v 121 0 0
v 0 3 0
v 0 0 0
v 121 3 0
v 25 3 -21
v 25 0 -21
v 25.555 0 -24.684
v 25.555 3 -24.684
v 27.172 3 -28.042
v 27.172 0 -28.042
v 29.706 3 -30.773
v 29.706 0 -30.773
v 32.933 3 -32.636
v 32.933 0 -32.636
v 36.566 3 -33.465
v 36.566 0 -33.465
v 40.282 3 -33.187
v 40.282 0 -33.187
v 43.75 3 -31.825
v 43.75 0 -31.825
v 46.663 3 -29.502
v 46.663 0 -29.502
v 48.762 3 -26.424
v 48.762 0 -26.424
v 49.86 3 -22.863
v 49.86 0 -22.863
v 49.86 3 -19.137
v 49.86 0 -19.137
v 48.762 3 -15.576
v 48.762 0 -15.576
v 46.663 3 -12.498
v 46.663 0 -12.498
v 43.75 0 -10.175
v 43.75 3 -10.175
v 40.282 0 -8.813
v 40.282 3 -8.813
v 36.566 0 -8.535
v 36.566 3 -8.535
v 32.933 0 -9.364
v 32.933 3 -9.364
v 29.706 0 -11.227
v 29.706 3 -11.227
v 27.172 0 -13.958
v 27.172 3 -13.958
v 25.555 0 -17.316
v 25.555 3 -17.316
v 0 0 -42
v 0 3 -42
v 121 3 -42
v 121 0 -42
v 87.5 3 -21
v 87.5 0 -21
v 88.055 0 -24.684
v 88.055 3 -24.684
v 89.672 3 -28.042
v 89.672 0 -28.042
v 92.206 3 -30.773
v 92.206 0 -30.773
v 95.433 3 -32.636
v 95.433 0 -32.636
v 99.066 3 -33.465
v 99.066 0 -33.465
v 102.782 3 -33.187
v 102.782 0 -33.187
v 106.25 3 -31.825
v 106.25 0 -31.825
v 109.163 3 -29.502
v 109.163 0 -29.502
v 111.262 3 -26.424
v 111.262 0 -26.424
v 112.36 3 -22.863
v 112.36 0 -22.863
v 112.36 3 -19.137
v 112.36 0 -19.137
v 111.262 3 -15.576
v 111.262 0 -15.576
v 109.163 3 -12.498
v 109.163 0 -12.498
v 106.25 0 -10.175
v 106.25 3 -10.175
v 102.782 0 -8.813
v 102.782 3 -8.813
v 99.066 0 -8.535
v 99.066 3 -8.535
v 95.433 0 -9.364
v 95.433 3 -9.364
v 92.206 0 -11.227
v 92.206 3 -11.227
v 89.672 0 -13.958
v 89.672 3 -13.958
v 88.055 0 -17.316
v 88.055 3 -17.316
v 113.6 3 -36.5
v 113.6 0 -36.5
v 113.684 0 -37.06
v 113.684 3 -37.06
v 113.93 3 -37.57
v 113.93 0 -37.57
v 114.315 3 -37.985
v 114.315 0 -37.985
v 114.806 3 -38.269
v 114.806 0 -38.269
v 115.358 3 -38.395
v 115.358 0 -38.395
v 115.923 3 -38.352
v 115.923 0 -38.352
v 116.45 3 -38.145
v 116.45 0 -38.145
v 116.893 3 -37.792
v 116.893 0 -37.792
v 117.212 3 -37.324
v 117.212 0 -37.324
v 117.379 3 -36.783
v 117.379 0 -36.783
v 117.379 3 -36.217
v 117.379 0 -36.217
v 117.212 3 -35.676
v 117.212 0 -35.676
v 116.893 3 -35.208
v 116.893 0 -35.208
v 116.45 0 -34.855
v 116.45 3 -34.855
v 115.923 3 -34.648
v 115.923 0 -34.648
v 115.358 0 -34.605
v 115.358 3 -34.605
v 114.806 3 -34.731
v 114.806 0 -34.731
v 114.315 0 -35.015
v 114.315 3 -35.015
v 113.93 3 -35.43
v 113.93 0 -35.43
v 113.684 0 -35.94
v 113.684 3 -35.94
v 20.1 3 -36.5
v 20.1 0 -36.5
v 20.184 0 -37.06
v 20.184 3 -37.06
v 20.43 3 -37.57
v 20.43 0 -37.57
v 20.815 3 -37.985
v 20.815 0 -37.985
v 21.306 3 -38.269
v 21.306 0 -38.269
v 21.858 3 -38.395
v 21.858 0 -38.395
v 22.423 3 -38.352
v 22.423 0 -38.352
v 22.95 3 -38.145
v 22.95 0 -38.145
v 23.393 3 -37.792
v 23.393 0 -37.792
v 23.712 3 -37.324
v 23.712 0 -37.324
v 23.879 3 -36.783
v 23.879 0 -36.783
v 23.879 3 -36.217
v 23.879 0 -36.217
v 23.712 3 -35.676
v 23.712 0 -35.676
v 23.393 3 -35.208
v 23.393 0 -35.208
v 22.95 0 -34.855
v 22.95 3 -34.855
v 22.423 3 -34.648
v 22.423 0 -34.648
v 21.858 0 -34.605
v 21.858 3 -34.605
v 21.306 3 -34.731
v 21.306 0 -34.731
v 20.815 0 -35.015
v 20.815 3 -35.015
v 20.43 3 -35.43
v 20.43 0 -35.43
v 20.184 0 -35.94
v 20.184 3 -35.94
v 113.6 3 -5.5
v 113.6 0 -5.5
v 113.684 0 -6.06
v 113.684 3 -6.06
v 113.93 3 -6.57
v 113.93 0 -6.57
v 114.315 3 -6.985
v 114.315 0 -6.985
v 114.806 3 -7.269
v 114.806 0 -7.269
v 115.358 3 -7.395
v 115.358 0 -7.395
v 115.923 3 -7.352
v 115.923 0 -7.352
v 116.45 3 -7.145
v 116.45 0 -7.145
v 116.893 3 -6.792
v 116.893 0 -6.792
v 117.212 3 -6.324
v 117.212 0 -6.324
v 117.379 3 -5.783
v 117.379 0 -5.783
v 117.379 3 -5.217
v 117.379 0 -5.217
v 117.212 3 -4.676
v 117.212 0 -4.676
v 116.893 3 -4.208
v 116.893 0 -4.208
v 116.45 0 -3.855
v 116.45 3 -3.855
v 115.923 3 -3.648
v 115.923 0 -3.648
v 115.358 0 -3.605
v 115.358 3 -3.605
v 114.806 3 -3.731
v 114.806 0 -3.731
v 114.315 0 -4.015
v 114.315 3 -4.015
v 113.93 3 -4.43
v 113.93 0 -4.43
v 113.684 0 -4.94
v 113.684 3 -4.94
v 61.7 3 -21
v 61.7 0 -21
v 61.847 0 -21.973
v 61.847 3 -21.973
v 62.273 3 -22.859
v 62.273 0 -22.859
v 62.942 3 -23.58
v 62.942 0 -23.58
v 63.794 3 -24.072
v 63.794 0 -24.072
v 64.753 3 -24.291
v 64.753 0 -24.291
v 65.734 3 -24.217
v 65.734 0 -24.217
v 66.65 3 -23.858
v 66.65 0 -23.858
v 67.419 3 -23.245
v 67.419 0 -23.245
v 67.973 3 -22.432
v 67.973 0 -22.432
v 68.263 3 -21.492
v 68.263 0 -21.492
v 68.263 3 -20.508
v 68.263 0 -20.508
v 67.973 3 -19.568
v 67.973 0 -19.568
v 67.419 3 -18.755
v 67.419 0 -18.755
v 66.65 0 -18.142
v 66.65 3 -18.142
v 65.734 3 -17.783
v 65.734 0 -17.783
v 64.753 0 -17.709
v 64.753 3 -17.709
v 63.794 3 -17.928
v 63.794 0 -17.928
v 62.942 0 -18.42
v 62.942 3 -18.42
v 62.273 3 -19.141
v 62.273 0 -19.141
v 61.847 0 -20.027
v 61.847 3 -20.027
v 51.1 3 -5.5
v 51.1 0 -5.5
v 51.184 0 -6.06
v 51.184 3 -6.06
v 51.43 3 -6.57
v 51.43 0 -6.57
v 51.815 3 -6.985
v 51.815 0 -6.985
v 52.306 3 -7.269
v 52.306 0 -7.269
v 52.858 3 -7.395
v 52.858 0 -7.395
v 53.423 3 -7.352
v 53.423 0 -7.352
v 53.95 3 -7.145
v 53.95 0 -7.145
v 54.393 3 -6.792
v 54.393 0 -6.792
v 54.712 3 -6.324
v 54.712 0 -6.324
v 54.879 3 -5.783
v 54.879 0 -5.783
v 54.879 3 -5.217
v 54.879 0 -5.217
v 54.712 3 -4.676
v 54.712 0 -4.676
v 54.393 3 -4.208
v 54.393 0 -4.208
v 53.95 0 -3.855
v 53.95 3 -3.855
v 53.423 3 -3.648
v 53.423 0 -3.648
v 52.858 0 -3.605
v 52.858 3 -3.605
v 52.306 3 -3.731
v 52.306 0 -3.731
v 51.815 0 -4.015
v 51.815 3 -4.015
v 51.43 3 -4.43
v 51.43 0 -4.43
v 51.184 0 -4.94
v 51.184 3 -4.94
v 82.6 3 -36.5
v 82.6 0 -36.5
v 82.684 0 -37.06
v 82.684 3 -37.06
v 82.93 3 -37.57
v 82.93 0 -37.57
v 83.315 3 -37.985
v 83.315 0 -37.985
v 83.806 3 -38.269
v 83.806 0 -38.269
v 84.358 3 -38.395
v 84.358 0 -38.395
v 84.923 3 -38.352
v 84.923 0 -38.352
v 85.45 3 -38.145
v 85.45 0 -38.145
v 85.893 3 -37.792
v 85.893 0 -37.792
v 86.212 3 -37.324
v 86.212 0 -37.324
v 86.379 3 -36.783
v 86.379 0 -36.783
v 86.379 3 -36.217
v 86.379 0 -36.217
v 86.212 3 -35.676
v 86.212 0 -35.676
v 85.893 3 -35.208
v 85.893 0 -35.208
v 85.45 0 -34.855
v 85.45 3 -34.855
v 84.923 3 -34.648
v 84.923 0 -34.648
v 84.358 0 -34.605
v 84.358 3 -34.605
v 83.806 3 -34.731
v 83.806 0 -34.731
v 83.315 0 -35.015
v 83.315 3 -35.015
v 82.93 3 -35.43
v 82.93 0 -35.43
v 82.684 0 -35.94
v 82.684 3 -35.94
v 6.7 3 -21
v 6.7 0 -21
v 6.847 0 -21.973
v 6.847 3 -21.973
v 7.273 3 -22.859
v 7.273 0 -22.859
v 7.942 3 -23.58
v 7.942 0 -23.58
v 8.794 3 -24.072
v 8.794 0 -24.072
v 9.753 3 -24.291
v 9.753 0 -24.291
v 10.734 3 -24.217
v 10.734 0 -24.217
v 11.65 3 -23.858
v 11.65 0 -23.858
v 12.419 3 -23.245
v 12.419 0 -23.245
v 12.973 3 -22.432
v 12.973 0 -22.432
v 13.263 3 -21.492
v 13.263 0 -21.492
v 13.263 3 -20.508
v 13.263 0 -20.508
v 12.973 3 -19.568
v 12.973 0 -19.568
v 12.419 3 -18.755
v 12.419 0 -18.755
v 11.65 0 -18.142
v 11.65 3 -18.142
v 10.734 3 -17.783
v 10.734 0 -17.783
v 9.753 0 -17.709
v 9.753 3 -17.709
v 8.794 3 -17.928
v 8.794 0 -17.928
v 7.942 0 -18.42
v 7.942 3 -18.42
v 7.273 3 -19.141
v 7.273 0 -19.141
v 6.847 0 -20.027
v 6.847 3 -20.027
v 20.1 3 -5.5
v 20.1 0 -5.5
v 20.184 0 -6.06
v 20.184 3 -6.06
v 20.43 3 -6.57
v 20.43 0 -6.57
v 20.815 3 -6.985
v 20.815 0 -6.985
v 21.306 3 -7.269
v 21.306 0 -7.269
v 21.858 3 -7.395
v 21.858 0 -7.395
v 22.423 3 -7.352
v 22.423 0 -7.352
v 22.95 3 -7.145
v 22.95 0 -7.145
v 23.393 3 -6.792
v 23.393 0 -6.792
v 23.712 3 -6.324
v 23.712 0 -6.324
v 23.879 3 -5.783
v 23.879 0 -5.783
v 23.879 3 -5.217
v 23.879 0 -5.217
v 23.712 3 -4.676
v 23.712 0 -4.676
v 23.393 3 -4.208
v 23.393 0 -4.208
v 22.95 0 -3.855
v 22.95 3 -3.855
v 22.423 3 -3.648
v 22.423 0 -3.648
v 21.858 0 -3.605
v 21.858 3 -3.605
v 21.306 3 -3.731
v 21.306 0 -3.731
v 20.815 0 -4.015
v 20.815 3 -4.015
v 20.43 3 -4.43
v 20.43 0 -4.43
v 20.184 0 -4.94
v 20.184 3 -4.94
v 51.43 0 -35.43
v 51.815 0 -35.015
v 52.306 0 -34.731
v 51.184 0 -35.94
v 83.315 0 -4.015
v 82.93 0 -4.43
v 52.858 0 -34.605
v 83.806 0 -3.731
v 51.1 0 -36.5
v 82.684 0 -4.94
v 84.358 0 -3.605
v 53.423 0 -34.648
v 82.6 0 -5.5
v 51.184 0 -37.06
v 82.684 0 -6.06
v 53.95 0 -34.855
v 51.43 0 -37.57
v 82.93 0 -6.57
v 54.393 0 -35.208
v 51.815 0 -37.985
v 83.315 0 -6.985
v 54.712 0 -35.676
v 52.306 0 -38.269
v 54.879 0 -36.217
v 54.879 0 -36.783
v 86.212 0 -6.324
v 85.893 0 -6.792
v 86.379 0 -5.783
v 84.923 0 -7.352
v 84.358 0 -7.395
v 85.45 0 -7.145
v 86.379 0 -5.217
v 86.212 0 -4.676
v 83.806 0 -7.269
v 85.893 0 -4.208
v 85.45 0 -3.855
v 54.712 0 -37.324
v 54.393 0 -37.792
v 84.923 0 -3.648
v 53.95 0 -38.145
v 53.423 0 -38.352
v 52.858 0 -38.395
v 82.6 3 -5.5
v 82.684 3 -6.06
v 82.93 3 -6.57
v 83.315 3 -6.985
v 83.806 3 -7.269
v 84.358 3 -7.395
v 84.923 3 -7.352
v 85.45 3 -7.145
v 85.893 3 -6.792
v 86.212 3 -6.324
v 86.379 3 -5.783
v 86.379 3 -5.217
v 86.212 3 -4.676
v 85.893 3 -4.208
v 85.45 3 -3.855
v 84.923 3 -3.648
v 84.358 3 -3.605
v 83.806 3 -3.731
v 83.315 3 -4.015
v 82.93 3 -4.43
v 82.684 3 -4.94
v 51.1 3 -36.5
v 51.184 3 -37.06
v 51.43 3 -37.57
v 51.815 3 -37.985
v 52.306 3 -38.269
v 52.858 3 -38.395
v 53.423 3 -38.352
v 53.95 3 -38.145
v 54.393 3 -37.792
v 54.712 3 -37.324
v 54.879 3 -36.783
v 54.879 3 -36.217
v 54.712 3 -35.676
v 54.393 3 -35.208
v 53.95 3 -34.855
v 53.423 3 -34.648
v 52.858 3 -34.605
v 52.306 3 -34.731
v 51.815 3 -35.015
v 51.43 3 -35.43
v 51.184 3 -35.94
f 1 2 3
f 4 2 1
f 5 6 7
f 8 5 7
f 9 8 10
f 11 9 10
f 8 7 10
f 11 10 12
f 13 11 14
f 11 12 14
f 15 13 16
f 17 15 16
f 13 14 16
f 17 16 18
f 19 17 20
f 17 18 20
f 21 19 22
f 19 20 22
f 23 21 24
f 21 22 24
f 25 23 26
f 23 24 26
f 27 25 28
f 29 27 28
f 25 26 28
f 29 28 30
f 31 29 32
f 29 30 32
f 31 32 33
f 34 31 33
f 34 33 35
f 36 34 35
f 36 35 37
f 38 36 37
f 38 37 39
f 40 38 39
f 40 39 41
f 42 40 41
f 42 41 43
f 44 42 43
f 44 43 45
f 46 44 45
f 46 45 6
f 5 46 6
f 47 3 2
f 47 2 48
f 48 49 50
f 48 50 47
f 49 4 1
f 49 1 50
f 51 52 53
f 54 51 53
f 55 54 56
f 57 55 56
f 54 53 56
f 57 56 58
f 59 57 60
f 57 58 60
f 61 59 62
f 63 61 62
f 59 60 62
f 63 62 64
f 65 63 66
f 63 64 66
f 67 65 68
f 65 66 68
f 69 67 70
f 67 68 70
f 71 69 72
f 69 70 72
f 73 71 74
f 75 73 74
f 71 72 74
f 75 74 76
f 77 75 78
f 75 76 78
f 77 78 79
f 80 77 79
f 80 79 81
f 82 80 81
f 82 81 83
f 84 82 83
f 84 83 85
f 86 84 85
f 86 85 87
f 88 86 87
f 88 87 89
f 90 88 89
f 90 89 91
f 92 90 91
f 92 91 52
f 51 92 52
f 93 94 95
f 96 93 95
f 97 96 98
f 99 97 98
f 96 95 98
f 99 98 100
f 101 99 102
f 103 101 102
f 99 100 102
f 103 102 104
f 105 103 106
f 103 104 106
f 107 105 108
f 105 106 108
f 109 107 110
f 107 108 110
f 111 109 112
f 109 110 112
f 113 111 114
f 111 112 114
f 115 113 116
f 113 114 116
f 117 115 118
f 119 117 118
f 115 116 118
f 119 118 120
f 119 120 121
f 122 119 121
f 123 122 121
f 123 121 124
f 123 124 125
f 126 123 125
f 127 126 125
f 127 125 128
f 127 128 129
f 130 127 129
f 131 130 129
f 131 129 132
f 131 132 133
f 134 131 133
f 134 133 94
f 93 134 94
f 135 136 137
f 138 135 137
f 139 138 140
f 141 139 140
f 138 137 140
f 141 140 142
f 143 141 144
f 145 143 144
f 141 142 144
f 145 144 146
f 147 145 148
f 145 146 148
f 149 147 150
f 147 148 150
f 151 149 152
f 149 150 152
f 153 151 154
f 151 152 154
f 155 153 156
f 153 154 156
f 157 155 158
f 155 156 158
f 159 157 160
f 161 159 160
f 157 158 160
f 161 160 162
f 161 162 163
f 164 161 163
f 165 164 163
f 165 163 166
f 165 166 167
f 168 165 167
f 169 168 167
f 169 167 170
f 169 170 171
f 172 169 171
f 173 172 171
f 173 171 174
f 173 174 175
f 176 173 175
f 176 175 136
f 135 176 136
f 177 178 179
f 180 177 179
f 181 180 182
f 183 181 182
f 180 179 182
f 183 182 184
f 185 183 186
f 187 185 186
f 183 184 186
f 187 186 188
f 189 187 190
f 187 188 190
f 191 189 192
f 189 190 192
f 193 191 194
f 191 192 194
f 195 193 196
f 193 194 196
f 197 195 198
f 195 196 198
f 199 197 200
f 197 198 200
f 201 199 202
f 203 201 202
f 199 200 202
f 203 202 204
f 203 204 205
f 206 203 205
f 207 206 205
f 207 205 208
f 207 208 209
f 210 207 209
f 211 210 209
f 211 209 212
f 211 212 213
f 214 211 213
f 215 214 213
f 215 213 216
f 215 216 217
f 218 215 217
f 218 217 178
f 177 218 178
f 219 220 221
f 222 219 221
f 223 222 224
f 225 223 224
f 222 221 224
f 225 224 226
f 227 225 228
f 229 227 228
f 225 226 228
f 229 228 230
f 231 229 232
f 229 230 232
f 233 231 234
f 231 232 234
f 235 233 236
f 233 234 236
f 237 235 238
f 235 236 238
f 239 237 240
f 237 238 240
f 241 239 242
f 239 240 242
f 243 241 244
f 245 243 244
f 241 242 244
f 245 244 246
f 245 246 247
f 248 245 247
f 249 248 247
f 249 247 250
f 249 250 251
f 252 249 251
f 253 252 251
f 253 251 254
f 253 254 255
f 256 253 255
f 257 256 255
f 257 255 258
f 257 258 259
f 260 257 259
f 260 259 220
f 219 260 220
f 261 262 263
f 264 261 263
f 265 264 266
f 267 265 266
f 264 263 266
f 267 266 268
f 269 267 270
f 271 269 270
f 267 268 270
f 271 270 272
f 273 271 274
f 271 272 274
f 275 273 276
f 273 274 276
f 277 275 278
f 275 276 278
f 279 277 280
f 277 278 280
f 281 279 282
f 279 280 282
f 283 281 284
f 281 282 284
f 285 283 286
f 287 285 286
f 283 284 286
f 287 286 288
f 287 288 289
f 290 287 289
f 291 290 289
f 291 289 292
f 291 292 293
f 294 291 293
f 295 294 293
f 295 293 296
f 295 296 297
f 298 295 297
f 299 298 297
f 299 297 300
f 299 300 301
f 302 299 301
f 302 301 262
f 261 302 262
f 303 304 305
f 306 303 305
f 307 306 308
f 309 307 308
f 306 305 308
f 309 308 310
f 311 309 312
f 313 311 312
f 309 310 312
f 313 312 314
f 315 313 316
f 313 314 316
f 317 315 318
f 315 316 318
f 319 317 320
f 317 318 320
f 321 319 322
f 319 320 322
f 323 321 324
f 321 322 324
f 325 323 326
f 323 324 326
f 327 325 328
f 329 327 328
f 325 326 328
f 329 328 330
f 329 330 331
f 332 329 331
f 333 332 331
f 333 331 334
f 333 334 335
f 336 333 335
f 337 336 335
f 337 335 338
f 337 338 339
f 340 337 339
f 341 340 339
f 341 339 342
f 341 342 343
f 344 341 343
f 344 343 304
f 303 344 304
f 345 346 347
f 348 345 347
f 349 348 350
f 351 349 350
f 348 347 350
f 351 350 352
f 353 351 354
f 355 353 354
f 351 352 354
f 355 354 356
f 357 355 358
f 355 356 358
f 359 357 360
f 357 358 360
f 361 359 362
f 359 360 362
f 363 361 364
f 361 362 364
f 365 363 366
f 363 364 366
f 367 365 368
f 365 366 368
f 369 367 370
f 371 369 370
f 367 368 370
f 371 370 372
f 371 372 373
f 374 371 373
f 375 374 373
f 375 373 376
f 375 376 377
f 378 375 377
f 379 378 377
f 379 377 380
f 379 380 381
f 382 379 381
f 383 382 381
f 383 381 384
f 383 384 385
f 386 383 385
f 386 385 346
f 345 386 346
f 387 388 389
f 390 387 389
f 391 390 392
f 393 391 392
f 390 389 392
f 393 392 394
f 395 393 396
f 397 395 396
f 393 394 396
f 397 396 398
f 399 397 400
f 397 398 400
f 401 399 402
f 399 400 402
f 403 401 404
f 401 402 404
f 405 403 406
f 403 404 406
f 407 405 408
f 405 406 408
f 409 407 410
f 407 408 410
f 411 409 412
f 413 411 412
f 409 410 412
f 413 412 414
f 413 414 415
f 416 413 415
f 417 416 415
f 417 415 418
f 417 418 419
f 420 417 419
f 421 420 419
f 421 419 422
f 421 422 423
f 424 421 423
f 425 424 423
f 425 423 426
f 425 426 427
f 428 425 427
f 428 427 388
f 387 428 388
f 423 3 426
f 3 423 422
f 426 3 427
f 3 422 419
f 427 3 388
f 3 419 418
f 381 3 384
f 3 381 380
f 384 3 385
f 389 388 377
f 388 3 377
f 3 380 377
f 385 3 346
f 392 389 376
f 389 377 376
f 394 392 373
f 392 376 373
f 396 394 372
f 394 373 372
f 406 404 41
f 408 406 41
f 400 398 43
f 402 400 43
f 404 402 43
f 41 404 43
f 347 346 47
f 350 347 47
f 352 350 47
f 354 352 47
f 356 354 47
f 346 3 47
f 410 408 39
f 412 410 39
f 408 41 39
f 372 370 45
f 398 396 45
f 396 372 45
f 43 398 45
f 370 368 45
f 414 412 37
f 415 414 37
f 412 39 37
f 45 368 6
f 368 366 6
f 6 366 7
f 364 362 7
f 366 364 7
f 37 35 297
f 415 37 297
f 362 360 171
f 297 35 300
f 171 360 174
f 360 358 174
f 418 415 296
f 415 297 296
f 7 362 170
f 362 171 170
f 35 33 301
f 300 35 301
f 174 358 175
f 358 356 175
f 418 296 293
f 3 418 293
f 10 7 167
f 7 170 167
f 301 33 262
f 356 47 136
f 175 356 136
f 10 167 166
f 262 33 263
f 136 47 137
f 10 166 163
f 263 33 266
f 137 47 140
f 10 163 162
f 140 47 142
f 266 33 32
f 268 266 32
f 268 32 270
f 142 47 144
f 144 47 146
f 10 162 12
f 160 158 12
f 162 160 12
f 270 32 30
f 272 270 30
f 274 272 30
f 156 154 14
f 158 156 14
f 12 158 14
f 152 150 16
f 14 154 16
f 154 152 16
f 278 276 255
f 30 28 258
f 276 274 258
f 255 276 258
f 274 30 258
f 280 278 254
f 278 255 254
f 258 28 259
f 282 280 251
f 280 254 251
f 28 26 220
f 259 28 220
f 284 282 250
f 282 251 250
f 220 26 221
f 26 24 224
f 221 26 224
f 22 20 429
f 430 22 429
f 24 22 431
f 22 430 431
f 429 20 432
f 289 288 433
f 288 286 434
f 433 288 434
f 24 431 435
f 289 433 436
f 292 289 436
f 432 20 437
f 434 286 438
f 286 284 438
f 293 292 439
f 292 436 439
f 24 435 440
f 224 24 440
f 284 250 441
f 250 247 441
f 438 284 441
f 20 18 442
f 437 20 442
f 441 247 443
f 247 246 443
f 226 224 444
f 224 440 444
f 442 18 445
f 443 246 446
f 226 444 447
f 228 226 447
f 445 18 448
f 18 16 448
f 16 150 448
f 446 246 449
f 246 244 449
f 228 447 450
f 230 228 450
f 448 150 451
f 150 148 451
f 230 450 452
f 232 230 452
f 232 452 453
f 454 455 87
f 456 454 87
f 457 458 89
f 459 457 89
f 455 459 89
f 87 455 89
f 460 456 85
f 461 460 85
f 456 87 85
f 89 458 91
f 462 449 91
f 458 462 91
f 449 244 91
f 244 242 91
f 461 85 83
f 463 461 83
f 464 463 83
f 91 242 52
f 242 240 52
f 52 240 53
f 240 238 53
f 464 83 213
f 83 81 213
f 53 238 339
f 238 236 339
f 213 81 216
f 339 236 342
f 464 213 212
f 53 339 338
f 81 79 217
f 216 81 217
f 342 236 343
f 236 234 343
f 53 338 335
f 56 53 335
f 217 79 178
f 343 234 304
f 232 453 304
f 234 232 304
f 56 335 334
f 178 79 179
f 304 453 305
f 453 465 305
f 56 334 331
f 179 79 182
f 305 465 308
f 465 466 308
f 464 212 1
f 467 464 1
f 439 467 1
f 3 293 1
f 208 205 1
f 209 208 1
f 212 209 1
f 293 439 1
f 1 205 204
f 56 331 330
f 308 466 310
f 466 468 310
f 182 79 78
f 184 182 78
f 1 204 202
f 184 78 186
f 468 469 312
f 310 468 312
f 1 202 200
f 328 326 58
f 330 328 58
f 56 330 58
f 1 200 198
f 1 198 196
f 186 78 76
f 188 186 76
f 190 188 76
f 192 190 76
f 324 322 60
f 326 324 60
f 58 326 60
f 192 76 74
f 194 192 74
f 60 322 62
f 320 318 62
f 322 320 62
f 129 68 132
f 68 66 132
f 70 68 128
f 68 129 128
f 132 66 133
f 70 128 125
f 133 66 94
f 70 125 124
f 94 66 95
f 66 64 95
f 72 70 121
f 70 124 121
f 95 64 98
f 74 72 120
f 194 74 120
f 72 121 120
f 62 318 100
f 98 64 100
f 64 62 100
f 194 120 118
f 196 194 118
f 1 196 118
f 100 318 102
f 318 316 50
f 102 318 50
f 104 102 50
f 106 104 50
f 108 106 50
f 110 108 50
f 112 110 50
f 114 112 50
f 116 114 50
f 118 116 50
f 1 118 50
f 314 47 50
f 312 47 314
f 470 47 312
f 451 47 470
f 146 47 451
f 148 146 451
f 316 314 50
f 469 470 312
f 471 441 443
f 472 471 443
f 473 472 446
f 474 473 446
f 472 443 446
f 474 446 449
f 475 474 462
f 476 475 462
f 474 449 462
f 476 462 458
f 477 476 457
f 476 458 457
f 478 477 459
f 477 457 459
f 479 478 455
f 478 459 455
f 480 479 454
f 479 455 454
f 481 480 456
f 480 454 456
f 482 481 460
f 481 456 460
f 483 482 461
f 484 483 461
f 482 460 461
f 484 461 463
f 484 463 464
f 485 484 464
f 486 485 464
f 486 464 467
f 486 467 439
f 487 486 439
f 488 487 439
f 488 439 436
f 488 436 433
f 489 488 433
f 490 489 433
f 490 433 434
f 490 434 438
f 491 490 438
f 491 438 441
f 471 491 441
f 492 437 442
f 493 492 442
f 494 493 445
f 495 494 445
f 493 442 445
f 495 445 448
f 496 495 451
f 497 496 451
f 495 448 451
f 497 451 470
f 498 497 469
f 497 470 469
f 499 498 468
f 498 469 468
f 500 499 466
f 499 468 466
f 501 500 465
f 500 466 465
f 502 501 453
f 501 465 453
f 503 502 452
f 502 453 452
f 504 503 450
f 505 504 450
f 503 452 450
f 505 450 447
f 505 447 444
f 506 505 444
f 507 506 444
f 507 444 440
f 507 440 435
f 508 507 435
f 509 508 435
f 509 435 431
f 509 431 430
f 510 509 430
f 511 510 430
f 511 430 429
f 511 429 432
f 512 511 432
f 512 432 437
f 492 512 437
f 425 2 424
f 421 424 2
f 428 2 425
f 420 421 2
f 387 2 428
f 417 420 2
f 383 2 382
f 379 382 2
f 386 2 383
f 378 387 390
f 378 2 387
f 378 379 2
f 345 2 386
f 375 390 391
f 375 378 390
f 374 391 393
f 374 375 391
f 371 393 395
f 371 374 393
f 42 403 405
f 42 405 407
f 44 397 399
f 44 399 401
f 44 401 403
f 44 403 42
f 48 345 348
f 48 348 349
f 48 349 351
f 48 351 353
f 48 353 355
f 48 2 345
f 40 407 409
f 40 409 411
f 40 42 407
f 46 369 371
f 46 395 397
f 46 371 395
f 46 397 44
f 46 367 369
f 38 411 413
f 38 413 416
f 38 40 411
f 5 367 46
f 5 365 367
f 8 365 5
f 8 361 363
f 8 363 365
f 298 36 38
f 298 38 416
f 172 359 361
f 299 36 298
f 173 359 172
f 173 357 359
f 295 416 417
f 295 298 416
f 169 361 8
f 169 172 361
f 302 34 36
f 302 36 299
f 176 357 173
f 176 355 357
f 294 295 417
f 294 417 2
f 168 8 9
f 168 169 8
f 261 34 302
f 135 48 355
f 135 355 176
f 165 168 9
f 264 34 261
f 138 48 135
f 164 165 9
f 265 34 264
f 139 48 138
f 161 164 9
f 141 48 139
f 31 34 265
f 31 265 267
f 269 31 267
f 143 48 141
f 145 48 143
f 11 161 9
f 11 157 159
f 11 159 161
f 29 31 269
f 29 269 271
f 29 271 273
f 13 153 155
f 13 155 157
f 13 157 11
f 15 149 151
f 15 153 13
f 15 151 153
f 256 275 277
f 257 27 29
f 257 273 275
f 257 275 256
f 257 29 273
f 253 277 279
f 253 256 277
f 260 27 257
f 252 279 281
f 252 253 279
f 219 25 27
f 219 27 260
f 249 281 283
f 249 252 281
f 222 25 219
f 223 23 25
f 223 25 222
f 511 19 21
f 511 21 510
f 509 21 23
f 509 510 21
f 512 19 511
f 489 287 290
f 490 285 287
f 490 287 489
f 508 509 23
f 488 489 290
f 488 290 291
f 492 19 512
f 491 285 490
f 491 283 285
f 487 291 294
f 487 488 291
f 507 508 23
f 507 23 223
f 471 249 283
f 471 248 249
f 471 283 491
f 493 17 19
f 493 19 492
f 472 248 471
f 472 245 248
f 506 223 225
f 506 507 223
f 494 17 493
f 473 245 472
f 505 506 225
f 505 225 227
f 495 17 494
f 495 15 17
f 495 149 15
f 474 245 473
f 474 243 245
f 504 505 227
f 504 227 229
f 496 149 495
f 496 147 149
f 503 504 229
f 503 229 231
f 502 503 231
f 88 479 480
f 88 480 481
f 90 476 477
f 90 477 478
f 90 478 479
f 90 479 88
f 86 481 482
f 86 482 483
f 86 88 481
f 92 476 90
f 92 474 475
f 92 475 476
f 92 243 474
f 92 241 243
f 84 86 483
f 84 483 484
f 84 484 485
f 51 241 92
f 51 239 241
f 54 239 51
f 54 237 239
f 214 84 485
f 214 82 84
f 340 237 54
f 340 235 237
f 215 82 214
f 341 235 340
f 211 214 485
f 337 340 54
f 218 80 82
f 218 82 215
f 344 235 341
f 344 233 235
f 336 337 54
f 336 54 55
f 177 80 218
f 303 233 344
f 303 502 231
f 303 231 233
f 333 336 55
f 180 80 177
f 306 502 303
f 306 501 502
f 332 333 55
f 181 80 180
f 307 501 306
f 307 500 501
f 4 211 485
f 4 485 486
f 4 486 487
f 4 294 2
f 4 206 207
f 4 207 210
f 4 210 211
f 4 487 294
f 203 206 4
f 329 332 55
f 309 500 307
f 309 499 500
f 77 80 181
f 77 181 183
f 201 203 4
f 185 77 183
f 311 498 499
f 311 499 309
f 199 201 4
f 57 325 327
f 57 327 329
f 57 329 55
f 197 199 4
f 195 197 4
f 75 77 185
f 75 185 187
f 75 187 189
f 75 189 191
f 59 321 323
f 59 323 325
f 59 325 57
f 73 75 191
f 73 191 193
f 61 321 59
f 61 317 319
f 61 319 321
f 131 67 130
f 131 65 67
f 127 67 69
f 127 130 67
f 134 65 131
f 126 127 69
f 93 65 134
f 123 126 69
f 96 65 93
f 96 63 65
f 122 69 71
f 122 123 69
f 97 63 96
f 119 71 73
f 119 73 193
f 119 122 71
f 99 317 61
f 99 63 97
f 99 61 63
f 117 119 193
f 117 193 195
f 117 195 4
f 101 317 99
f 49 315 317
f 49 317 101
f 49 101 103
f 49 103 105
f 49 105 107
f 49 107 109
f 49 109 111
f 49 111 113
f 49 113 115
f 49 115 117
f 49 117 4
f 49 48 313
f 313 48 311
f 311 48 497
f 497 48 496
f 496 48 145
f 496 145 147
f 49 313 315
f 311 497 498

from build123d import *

# Parameters (mm, degrees)
SKETCH_1_W      = 75
SKETCH_1_H      = 42
EXTRUDE_1_DEPTH = 3
HOLE_WIZARD_1_D = 3.8
HOLE_WIZARD_2_D = 6.6
HOLE_WIZARD_3_D = 25
EXTRUDE_2_DEPTH = 3
HOLE_WIZARD_4_D = 3.8
HOLE_WIZARD_5_D = 25


with BuildPart() as part:
    # 草图1 → 凸台-拉伸1 (new body)
    with BuildSketch(Plane(origin=(0, 0, 0), x_dir=(1, 0, 0), z_dir=(0, 1, 0))):
        with Locations((37.5, 21)):
            Rectangle(SKETCH_1_W, SKETCH_1_H)
    extrude(amount=EXTRUDE_1_DEPTH)

    # 孔1 (through all)
    with Locations(Plane(origin=(0, 3, 0), x_dir=(1, 0, 0), z_dir=(0, 1, 0))):
        with Locations((22, 36.5), (53, 36.5), (53, 5.5), (22, 5.5)):
            Hole(HOLE_WIZARD_1_D / 2)

    # 孔2 (through all)
    with Locations(Plane(origin=(0, 3, 0), x_dir=(1, 0, 0), z_dir=(0, 1, 0))):
        with Locations((10, 21), (65, 21)):
            Hole(HOLE_WIZARD_2_D / 2)

    # 孔3 (through all)
    with Locations(Plane(origin=(0, 3, 0), x_dir=(1, 0, 0), z_dir=(0, 1, 0))):
        with Locations((37.5, 21)):
            Hole(HOLE_WIZARD_3_D / 2)

    # 草图9 → 凸台-拉伸2 (add)
    with BuildSketch(Plane(origin=(0, 3, 0), x_dir=(1, 0, 0), z_dir=(0, 1, 0))):
        Polygon((121, 42), (75, 42), (75, 21), (75, 0), (121, 0), align=None)
    extrude(amount=-EXTRUDE_2_DEPTH)

    # 孔4 (through all)
    with Locations(Plane(origin=(0, 3, 0), x_dir=(1, 0, 0), z_dir=(0, 1, 0))):
        with Locations((84.5, 36.5), (115.5, 36.5), (115.5, 5.5), (84.5, 5.5)):
            Hole(HOLE_WIZARD_4_D / 2)

    # 孔5 (through all)
    with Locations(Plane(origin=(0, 3, 0), x_dir=(1, 0, 0), z_dir=(0, 1, 0))):
        with Locations((100, 21)):
            Hole(HOLE_WIZARD_5_D / 2)


solid = part.part
